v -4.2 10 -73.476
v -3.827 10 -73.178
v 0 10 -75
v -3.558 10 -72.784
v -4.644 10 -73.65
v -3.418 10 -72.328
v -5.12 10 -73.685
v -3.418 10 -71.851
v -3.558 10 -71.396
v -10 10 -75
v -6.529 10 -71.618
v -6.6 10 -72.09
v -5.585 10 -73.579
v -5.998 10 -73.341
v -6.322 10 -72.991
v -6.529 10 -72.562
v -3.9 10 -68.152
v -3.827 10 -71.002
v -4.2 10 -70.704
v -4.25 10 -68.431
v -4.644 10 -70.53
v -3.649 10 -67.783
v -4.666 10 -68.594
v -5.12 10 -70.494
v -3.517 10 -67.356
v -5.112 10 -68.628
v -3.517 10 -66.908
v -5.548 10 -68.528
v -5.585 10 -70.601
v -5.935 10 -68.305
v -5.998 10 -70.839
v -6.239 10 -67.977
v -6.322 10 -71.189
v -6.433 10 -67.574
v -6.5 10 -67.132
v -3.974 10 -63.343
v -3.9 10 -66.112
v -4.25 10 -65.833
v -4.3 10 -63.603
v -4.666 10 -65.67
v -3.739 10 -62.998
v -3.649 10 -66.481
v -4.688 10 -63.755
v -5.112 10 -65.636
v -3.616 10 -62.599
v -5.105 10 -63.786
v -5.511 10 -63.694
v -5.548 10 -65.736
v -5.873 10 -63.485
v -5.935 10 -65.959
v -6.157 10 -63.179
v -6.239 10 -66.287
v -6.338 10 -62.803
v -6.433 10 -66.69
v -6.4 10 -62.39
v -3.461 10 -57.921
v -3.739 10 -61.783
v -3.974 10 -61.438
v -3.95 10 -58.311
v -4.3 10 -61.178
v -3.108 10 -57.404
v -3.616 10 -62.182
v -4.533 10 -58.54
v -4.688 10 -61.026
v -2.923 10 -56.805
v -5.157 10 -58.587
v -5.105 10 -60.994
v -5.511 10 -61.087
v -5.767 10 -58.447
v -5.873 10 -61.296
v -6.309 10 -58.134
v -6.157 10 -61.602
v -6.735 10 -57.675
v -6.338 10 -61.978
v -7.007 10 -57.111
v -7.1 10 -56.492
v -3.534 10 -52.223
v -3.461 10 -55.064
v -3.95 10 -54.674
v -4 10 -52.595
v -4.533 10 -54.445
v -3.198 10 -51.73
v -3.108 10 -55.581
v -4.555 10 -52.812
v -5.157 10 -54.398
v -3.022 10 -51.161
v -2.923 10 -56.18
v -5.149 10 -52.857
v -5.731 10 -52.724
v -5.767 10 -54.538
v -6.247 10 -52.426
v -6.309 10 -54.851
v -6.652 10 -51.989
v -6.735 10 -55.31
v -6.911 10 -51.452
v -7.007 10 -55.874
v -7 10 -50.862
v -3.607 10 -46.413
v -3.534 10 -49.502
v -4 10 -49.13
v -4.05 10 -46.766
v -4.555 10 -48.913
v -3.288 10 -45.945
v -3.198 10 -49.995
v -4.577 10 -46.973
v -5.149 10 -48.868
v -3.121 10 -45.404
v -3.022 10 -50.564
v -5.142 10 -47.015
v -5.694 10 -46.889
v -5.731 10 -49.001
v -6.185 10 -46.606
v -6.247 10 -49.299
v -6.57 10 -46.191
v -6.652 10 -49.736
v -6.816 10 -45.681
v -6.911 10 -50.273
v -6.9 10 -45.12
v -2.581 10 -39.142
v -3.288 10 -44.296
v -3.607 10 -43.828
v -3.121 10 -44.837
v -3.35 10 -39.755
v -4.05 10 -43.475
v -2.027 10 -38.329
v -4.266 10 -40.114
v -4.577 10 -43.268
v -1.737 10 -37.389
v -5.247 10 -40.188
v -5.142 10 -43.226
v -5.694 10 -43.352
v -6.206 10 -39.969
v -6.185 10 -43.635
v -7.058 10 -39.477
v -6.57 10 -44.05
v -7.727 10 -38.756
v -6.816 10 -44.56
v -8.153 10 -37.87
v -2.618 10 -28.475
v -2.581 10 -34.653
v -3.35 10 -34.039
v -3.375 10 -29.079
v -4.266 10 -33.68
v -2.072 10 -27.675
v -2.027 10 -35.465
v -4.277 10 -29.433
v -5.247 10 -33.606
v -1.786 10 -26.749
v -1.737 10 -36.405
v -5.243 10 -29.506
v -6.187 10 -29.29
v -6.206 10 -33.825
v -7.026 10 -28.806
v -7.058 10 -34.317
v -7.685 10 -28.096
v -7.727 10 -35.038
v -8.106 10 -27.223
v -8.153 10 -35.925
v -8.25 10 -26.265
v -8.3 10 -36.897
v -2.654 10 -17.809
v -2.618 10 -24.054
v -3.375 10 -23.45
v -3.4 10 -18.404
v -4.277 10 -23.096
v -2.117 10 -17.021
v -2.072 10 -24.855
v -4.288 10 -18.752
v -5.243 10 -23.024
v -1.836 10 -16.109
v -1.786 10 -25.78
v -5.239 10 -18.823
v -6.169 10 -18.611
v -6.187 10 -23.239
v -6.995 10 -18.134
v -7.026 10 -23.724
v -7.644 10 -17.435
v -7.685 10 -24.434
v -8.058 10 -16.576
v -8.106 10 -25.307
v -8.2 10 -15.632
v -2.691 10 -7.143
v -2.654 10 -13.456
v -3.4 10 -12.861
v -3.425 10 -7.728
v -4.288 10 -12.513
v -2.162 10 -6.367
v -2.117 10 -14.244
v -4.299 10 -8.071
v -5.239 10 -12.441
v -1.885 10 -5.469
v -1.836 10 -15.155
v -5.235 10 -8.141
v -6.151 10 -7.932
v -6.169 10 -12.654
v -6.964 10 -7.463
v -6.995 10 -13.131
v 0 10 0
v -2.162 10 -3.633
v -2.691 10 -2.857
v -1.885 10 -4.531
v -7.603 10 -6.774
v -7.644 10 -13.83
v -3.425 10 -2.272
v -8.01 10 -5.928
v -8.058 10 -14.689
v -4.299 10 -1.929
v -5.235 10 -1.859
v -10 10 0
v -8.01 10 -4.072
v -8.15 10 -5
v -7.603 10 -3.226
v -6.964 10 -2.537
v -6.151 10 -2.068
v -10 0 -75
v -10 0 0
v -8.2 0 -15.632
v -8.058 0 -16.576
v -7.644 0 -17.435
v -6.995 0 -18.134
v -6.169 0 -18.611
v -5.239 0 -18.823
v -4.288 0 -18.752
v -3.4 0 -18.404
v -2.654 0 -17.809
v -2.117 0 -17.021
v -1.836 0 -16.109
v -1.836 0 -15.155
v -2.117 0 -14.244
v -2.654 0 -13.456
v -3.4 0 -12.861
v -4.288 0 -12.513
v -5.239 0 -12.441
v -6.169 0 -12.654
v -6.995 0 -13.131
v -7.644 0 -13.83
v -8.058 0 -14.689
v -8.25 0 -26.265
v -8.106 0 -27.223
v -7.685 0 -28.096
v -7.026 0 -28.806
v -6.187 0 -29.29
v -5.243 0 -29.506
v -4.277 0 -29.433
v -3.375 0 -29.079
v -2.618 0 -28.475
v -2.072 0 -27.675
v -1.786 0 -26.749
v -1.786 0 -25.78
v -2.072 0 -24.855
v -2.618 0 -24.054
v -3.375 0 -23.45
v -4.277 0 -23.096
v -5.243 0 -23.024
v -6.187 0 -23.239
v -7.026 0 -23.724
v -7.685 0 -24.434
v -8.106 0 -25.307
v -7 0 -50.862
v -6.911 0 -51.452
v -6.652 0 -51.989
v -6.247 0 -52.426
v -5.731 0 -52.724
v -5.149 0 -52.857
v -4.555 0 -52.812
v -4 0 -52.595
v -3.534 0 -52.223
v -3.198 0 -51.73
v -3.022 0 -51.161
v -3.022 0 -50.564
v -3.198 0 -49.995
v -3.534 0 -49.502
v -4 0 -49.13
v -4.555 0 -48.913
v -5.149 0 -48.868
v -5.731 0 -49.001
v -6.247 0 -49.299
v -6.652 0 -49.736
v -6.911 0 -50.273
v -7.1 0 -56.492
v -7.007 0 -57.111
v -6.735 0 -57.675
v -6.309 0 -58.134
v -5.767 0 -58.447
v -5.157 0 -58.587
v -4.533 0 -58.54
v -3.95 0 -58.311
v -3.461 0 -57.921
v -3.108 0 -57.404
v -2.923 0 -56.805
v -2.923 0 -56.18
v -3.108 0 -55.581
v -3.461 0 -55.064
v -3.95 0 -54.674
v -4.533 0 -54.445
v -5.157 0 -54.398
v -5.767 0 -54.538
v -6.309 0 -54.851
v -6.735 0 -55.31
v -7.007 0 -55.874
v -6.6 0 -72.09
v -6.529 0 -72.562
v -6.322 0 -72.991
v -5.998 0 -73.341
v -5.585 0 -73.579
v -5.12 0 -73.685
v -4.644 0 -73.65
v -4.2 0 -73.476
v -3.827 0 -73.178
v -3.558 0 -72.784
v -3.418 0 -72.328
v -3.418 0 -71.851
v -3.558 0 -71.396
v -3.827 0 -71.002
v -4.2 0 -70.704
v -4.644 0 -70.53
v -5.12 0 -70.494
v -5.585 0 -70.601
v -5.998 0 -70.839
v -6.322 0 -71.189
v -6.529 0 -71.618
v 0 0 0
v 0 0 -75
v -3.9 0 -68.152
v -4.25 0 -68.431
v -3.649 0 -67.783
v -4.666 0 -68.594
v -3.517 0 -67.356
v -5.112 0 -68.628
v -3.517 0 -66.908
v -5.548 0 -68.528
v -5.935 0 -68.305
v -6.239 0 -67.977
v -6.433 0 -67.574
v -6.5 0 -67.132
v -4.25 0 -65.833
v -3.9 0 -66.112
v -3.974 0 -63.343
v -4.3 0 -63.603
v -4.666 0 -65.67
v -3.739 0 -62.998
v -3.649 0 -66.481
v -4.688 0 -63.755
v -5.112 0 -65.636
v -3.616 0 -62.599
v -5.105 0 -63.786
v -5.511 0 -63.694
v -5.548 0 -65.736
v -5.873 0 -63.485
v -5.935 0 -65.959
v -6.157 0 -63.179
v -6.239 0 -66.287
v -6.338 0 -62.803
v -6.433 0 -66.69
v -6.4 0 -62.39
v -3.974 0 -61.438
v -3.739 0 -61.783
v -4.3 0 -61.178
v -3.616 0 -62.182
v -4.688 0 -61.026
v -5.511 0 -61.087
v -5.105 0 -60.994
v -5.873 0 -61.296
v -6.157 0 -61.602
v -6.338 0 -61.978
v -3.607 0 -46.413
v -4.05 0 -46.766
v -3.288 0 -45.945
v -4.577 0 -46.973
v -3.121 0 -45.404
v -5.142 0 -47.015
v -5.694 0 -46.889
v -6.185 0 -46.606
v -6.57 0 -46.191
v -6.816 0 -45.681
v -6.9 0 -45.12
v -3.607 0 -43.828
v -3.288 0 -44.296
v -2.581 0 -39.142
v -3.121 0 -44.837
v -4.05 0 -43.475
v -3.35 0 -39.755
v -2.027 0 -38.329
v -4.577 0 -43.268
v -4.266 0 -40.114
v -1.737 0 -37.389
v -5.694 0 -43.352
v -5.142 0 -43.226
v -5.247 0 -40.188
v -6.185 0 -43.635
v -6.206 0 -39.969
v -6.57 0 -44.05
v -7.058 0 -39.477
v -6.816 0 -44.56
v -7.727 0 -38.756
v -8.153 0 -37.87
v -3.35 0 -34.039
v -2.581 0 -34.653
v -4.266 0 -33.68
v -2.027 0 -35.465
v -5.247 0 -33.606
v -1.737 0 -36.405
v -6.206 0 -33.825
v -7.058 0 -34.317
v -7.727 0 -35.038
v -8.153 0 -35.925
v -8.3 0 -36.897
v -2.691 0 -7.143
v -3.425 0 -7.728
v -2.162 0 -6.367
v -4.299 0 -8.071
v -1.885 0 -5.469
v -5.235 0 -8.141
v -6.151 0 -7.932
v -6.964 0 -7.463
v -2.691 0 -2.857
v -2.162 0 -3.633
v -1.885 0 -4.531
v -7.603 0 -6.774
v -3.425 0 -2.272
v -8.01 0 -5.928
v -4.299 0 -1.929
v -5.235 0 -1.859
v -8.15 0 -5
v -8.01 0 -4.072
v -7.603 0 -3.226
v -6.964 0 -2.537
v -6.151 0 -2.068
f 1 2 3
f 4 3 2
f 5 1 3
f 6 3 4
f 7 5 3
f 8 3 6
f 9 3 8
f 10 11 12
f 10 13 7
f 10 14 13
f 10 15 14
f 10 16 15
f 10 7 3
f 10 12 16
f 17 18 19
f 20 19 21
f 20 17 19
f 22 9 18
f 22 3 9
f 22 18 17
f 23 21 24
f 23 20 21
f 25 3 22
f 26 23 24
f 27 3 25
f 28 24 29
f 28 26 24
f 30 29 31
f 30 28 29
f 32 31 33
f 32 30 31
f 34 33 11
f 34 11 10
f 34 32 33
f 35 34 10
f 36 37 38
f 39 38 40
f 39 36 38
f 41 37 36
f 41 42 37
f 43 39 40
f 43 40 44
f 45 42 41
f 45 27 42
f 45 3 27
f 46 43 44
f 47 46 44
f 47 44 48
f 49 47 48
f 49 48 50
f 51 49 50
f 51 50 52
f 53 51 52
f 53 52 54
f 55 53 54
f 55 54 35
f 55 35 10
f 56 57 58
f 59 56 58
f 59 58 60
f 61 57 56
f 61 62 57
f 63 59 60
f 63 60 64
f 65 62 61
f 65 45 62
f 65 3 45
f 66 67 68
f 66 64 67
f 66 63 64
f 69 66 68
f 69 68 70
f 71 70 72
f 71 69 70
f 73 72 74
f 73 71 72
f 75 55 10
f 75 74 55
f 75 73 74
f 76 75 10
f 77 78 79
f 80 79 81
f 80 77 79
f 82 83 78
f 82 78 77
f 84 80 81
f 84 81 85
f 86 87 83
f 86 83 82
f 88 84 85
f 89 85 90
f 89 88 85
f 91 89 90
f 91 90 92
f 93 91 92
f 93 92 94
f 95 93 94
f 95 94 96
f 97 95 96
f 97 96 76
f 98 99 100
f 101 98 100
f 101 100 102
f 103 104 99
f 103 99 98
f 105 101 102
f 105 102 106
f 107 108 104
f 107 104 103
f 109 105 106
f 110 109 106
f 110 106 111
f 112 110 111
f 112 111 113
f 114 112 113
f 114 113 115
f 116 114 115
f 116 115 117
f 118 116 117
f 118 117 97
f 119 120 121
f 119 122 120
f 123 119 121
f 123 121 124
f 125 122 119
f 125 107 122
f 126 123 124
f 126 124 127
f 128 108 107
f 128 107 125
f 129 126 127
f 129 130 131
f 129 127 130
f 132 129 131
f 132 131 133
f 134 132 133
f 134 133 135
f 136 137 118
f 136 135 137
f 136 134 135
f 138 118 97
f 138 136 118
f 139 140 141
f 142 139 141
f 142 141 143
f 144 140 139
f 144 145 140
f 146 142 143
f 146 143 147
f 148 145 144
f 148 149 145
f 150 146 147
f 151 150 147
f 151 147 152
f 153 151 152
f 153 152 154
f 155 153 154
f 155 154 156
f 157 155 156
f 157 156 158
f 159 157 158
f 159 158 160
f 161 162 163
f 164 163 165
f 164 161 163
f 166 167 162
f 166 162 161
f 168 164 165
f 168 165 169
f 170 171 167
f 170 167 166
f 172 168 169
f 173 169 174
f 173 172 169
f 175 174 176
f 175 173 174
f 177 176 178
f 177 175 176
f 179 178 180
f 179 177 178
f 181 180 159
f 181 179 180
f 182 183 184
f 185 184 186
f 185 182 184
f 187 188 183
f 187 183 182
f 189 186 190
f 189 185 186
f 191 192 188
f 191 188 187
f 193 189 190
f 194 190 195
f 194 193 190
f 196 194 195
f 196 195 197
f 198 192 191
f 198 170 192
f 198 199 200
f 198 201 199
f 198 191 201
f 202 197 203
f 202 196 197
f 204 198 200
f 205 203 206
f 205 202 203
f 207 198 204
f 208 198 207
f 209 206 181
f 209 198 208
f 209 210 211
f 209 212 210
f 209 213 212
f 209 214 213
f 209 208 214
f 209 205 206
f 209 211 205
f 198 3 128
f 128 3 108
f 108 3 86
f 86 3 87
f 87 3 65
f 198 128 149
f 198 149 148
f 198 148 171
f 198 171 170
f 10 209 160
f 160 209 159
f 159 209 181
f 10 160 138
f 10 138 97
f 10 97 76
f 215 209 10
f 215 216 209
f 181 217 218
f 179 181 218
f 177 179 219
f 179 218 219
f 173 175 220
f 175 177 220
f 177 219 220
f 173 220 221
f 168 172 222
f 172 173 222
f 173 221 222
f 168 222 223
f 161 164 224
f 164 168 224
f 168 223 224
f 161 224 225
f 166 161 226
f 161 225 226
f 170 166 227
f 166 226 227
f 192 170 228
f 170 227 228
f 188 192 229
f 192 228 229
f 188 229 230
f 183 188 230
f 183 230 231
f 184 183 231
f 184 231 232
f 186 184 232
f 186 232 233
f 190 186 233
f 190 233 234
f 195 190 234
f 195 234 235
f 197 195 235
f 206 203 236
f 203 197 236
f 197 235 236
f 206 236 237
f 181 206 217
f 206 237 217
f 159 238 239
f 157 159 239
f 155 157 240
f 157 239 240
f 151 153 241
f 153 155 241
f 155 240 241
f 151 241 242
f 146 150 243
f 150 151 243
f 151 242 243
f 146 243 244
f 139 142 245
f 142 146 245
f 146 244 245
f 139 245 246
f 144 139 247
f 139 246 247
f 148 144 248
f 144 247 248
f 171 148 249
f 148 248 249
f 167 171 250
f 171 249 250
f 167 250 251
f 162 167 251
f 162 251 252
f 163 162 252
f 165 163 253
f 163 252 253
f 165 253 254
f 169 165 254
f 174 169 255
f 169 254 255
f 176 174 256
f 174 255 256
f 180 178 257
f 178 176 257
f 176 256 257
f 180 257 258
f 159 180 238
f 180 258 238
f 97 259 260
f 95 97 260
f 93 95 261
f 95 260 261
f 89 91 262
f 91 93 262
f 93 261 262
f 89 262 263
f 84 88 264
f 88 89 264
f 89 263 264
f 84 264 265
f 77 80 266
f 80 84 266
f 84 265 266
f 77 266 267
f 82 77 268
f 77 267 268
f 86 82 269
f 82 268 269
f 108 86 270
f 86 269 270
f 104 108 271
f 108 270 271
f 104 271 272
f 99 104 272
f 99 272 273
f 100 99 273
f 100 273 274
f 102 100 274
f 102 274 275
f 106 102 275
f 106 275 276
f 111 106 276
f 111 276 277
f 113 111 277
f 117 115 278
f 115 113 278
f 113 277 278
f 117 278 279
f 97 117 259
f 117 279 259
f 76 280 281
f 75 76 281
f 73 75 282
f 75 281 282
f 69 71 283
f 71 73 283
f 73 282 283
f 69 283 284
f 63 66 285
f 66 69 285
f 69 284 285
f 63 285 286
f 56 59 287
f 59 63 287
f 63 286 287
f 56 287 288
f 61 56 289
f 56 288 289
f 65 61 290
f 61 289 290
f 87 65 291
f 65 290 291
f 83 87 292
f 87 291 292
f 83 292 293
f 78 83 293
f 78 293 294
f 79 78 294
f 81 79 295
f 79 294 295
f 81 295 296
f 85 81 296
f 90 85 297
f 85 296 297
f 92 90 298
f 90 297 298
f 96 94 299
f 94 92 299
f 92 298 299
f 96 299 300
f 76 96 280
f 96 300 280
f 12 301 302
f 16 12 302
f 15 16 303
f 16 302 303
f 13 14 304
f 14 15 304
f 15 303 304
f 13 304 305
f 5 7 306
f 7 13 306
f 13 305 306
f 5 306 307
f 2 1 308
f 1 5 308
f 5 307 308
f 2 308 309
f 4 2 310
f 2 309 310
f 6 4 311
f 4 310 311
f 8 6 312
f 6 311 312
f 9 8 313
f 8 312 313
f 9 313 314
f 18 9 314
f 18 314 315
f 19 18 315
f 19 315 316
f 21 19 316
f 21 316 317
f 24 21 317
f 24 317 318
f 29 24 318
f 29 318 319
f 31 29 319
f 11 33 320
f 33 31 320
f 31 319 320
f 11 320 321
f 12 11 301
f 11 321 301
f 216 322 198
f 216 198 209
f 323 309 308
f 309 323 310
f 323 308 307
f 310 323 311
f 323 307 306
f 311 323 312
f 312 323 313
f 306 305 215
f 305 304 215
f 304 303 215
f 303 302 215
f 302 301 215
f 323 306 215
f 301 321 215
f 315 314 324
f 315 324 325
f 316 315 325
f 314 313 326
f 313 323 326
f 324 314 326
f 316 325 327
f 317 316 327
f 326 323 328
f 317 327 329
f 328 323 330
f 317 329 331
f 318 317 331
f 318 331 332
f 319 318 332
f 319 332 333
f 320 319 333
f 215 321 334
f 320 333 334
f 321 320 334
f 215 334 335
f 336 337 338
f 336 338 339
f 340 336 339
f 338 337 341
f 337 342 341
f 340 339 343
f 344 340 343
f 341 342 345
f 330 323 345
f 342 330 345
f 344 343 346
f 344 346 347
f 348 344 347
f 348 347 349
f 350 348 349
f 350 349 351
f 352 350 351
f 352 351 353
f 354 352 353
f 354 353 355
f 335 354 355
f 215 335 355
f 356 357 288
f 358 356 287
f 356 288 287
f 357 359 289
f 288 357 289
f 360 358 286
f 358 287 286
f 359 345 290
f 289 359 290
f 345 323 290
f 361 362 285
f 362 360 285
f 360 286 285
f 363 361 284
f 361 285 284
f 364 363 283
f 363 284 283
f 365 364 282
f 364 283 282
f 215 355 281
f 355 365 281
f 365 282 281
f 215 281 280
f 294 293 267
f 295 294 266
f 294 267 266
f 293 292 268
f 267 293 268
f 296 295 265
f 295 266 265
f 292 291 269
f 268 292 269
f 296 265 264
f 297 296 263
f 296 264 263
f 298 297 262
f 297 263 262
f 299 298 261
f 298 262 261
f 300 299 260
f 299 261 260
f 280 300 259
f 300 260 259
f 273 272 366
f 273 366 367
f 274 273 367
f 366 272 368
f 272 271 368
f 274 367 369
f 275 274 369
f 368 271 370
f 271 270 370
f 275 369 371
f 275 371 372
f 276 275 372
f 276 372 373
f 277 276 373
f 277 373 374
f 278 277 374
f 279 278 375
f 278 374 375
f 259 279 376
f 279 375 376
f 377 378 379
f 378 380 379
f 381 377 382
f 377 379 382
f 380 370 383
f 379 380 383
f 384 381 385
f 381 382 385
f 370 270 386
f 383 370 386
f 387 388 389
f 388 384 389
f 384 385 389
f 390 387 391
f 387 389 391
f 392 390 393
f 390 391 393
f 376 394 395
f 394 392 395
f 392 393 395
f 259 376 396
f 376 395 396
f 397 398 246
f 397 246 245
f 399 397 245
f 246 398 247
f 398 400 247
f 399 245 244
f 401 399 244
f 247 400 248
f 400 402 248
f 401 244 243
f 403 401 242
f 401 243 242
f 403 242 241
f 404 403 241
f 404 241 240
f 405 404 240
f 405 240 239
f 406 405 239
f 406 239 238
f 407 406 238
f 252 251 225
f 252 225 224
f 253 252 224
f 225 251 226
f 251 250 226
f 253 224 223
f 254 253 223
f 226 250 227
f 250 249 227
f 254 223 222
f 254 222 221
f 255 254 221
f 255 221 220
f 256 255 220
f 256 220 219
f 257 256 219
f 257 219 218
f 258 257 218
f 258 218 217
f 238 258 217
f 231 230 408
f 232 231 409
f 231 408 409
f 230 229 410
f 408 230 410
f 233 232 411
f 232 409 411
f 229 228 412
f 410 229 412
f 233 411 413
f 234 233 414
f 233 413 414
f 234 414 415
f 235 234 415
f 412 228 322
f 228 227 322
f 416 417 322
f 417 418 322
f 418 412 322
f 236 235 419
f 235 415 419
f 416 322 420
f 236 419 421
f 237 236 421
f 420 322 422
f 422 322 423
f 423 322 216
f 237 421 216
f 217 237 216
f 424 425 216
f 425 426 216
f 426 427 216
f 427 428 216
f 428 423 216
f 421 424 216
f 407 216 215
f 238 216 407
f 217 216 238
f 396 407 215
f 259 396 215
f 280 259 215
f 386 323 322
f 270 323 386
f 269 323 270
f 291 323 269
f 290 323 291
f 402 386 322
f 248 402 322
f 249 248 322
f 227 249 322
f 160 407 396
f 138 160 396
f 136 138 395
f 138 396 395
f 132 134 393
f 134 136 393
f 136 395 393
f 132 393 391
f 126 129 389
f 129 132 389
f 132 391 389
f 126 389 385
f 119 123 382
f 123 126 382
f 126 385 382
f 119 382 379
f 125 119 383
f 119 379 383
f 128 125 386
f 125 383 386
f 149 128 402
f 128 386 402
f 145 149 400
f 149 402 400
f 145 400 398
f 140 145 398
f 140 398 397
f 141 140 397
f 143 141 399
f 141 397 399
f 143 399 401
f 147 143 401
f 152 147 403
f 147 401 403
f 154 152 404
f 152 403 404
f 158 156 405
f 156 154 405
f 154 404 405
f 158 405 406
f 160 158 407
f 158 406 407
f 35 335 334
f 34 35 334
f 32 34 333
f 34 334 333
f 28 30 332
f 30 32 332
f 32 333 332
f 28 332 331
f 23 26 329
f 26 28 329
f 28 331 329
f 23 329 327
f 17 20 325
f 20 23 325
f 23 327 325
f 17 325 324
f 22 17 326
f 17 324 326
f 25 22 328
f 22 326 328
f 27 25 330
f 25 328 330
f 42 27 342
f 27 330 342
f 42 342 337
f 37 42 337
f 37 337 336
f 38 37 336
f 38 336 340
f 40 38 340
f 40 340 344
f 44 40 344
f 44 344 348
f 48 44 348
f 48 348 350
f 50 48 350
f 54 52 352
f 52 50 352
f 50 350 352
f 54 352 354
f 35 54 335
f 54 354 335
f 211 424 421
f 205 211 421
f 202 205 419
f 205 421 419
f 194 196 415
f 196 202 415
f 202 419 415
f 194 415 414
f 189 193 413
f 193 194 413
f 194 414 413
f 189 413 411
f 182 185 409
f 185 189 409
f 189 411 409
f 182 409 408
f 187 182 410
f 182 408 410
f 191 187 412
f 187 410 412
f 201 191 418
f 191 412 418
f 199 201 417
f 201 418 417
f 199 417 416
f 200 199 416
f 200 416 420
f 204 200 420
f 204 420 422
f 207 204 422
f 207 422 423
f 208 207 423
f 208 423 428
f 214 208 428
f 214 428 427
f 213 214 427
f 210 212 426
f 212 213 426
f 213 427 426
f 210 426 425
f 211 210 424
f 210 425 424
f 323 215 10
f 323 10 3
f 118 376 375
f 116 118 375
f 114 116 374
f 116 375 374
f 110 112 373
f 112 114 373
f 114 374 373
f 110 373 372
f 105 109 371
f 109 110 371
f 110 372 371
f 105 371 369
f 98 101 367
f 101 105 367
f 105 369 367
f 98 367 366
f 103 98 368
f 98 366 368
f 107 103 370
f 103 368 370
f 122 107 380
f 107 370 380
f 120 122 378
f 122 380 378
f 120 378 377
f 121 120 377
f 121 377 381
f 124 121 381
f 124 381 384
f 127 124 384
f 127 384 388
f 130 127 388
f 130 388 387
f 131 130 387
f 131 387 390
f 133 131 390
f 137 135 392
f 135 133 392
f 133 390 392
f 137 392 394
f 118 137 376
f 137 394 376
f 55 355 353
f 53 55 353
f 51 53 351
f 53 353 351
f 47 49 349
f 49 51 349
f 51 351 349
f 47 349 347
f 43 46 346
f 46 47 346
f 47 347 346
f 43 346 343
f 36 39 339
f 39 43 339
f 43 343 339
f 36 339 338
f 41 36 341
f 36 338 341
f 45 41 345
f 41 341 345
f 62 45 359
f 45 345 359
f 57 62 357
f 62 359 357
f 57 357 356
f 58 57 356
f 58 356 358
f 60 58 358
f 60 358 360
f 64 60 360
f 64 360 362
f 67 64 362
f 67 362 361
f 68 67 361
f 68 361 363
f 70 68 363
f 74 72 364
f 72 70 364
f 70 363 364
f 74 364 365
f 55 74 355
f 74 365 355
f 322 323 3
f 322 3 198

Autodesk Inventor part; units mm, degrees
ref_plane "YZ Plane" through (0, 0, 0) normal (1, 0, 0) x (0, 1, 0)
ref_plane "XZ Plane" through (0, 0, 0) normal (0, 1, 0) x (-1, 0, 0)
ref_plane "XY Plane" through (0, 0, 0) normal (0, 0, 1) x (1, 0, 0)
sketch "Szkic1" plane through (0, 0, 0) normal (0, 1, 0) x (-1, 0, 0)
  line L0 (0, 0) -> (10, 0)
  line L1 (10, 0) -> (10, -75)
  line L2 (10, -75) -> (0, -75)
  line L3 (0, -75) -> (0, 0)
  circle A0 centre (5, -5) radius 3.15
  circle A1 centre (5, -15.6324) radius 3.2
  circle A2 centre (5, -26.2648) radius 3.25
  circle A3 centre (5, -36.8972) radius 3.3
  line L4 (5, -5) -> (5, -15.6324) construction
  line L5 (5, -15.6324) -> (5, -26.2648) construction
  line L6 (5, -26.2648) -> (5, -36.8972) construction
  circle A4 centre (5, -45.1205) radius 1.9
  circle A5 centre (5, -56.4925) radius 2.1
  circle A6 centre (5, -50.8625) radius 2
  circle A7 centre (5, -62.3904) radius 1.4
  circle A8 centre (5, -67.132) radius 1.5
  circle A9 centre (5, -72.0899) radius 1.6
  line L7 (5, -36.8972) -> (5, -75) construction
  dimension "d0" = 10
  dimension "d1" = 75
  dimension "d2" = 6.3
  dimension "d3" = 6.4
  dimension "d4" = 6.5
  dimension "d5" = 6.6
  dimension "d6" = 5
  dimension "d7" = 3.8
  dimension "d8" = 4.2
  dimension "d9" = 4
  dimension "d12" = 2.8
  dimension "d13" = 3
  dimension "d14" = 3.2
extrude "Wyciągnięcie proste1" add sketch "Szkic1" along normal blind 10
properties part number "test_print"
